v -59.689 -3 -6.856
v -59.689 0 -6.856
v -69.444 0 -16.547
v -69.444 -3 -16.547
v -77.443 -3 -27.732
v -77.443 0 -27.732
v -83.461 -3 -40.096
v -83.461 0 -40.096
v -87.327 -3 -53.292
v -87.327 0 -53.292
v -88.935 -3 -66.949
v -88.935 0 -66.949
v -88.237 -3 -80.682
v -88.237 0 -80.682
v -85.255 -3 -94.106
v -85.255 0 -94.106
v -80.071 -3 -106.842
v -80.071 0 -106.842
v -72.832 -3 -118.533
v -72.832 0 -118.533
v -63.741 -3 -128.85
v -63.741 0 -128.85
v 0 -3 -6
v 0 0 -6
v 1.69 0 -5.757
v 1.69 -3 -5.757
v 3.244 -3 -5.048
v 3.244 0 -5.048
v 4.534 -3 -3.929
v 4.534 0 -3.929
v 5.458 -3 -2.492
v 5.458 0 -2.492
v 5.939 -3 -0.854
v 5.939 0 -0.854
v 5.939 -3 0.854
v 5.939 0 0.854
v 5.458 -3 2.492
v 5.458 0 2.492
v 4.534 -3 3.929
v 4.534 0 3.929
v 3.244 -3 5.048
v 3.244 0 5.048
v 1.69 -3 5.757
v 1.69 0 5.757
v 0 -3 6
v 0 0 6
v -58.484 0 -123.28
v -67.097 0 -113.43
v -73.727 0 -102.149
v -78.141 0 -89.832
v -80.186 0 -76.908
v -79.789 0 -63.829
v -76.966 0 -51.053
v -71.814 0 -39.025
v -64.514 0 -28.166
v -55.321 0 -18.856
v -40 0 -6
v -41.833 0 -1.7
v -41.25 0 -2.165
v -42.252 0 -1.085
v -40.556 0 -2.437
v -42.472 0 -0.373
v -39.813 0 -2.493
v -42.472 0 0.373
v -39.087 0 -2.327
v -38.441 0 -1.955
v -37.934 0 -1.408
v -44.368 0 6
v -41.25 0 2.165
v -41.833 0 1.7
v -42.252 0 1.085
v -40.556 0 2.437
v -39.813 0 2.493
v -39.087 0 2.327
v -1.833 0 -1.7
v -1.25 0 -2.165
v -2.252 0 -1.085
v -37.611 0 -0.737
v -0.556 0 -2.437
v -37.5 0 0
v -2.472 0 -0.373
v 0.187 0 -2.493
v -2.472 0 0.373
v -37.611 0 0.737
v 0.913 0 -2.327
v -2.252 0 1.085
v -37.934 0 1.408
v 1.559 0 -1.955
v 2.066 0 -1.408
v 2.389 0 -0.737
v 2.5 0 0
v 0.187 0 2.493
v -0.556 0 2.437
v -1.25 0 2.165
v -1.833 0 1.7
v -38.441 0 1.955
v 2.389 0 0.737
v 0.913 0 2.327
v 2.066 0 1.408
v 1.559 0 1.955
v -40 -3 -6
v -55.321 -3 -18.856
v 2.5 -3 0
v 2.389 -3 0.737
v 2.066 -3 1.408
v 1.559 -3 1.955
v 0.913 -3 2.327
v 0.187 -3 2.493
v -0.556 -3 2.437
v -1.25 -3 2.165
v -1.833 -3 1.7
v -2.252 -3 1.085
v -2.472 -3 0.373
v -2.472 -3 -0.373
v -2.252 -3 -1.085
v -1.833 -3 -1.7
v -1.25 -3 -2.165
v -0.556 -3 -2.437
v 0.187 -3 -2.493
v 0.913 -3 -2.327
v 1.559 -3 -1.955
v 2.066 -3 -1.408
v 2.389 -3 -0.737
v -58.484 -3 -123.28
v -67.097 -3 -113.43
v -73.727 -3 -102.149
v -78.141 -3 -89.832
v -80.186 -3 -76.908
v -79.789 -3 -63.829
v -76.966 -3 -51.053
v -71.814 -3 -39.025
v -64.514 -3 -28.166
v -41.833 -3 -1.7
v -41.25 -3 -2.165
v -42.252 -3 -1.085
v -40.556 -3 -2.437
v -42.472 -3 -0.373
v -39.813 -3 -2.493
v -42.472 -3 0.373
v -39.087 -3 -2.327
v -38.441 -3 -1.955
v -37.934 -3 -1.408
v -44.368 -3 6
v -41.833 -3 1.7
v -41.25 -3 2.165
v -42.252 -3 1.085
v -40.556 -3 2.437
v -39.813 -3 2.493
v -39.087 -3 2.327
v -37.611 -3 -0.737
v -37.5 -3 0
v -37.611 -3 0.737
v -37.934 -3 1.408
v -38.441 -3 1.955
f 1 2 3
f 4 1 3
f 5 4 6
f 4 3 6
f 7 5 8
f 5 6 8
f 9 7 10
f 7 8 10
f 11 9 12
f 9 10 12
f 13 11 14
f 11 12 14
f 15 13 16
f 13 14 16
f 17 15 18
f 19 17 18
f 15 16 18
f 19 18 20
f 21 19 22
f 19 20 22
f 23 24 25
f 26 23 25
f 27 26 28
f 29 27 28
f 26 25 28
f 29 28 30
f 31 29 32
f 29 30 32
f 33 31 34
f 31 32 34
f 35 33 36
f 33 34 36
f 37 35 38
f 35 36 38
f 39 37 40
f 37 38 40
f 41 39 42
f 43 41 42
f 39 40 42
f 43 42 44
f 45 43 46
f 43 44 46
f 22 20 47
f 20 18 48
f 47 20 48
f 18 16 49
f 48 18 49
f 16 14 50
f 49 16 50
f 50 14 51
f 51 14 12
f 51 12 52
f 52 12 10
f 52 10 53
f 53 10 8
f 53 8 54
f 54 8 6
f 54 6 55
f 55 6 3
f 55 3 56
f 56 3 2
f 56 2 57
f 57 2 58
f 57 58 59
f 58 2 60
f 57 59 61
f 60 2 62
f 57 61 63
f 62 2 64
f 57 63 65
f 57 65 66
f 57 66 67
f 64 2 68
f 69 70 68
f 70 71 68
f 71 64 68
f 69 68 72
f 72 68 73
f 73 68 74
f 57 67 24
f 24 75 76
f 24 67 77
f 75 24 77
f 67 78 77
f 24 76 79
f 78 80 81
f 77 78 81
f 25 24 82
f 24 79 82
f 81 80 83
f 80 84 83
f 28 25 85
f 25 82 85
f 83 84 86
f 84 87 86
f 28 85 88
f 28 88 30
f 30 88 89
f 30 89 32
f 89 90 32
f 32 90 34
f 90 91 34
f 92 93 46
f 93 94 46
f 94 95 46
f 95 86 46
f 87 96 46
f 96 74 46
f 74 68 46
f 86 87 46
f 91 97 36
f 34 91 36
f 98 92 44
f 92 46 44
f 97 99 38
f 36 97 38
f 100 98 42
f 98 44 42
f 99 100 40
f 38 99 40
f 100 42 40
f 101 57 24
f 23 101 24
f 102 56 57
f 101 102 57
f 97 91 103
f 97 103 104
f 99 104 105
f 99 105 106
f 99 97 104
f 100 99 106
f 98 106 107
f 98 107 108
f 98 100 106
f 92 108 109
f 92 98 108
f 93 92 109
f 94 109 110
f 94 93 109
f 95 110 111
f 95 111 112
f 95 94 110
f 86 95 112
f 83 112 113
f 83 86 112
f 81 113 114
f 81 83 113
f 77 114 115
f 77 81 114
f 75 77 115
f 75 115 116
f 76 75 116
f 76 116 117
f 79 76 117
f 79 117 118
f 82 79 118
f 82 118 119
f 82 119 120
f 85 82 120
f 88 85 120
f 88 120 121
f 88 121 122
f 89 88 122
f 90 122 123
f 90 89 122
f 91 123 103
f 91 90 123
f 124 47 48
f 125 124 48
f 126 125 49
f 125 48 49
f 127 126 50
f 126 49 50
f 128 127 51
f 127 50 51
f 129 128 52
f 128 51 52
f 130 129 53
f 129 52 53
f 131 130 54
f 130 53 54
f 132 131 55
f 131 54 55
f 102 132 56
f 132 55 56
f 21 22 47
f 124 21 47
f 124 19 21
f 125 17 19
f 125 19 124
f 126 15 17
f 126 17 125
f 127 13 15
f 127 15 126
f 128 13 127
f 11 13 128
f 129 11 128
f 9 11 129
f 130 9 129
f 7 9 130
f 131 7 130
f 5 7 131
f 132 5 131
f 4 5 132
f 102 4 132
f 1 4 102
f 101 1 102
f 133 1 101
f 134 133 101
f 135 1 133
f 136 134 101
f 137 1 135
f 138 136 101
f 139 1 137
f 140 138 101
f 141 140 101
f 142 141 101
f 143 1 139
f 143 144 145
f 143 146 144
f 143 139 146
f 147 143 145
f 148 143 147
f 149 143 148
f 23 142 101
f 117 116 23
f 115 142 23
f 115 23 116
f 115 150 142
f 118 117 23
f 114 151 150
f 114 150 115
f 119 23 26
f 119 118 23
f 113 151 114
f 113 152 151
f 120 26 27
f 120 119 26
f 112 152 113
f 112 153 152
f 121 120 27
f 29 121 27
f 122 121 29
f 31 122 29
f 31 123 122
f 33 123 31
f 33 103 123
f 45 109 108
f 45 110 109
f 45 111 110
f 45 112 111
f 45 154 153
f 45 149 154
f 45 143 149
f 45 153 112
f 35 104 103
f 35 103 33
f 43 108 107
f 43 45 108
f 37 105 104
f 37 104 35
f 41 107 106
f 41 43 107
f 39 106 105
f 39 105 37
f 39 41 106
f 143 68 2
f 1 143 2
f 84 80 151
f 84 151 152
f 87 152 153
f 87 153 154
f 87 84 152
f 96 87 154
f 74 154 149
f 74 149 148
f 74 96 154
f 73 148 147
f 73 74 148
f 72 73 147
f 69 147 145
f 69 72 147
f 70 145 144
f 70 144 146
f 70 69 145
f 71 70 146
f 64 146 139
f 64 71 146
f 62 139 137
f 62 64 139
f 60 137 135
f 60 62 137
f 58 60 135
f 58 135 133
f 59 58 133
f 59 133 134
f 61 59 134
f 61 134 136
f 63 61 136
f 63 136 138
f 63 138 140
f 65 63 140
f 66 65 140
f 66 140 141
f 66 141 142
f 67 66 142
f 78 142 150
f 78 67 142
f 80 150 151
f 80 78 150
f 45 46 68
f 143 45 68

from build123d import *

# Parameters (mm, degrees)
F0_R     = 2.5
F1_DEPTH = 3


with BuildPart() as f1:
    # F0 (on Front) → F1 (new body)
    with BuildSketch(Plane.XZ):
        with BuildLine():
            Line((-40, -6), (0, -6))
            ThreePointArc((0, -6), (6, 0), (0, 6))
            Line((0, 6), (-44.367643, 6))
            Line((-44.367643, 6), (-59.688532, -6.855752))
            ThreePointArc((-59.688532, -6.855752), (-88.934737, -66.948807), (-63.741269, -128.850383))
            Line((-63.741269, -128.850383), (-58.484232, -123.280056))
            ThreePointArc((-58.484232, -123.280056), (-80.29366, -70.359314), (-55.320889, -18.855752))
            Line((-55.320889, -18.855752), (-40, -6))
        make_face()
        with Locations((-40, 0)):
            Circle(F0_R, mode=Mode.SUBTRACT)
        Circle(F0_R, mode=Mode.SUBTRACT)
    extrude(amount=F1_DEPTH)


solid = f1.part
